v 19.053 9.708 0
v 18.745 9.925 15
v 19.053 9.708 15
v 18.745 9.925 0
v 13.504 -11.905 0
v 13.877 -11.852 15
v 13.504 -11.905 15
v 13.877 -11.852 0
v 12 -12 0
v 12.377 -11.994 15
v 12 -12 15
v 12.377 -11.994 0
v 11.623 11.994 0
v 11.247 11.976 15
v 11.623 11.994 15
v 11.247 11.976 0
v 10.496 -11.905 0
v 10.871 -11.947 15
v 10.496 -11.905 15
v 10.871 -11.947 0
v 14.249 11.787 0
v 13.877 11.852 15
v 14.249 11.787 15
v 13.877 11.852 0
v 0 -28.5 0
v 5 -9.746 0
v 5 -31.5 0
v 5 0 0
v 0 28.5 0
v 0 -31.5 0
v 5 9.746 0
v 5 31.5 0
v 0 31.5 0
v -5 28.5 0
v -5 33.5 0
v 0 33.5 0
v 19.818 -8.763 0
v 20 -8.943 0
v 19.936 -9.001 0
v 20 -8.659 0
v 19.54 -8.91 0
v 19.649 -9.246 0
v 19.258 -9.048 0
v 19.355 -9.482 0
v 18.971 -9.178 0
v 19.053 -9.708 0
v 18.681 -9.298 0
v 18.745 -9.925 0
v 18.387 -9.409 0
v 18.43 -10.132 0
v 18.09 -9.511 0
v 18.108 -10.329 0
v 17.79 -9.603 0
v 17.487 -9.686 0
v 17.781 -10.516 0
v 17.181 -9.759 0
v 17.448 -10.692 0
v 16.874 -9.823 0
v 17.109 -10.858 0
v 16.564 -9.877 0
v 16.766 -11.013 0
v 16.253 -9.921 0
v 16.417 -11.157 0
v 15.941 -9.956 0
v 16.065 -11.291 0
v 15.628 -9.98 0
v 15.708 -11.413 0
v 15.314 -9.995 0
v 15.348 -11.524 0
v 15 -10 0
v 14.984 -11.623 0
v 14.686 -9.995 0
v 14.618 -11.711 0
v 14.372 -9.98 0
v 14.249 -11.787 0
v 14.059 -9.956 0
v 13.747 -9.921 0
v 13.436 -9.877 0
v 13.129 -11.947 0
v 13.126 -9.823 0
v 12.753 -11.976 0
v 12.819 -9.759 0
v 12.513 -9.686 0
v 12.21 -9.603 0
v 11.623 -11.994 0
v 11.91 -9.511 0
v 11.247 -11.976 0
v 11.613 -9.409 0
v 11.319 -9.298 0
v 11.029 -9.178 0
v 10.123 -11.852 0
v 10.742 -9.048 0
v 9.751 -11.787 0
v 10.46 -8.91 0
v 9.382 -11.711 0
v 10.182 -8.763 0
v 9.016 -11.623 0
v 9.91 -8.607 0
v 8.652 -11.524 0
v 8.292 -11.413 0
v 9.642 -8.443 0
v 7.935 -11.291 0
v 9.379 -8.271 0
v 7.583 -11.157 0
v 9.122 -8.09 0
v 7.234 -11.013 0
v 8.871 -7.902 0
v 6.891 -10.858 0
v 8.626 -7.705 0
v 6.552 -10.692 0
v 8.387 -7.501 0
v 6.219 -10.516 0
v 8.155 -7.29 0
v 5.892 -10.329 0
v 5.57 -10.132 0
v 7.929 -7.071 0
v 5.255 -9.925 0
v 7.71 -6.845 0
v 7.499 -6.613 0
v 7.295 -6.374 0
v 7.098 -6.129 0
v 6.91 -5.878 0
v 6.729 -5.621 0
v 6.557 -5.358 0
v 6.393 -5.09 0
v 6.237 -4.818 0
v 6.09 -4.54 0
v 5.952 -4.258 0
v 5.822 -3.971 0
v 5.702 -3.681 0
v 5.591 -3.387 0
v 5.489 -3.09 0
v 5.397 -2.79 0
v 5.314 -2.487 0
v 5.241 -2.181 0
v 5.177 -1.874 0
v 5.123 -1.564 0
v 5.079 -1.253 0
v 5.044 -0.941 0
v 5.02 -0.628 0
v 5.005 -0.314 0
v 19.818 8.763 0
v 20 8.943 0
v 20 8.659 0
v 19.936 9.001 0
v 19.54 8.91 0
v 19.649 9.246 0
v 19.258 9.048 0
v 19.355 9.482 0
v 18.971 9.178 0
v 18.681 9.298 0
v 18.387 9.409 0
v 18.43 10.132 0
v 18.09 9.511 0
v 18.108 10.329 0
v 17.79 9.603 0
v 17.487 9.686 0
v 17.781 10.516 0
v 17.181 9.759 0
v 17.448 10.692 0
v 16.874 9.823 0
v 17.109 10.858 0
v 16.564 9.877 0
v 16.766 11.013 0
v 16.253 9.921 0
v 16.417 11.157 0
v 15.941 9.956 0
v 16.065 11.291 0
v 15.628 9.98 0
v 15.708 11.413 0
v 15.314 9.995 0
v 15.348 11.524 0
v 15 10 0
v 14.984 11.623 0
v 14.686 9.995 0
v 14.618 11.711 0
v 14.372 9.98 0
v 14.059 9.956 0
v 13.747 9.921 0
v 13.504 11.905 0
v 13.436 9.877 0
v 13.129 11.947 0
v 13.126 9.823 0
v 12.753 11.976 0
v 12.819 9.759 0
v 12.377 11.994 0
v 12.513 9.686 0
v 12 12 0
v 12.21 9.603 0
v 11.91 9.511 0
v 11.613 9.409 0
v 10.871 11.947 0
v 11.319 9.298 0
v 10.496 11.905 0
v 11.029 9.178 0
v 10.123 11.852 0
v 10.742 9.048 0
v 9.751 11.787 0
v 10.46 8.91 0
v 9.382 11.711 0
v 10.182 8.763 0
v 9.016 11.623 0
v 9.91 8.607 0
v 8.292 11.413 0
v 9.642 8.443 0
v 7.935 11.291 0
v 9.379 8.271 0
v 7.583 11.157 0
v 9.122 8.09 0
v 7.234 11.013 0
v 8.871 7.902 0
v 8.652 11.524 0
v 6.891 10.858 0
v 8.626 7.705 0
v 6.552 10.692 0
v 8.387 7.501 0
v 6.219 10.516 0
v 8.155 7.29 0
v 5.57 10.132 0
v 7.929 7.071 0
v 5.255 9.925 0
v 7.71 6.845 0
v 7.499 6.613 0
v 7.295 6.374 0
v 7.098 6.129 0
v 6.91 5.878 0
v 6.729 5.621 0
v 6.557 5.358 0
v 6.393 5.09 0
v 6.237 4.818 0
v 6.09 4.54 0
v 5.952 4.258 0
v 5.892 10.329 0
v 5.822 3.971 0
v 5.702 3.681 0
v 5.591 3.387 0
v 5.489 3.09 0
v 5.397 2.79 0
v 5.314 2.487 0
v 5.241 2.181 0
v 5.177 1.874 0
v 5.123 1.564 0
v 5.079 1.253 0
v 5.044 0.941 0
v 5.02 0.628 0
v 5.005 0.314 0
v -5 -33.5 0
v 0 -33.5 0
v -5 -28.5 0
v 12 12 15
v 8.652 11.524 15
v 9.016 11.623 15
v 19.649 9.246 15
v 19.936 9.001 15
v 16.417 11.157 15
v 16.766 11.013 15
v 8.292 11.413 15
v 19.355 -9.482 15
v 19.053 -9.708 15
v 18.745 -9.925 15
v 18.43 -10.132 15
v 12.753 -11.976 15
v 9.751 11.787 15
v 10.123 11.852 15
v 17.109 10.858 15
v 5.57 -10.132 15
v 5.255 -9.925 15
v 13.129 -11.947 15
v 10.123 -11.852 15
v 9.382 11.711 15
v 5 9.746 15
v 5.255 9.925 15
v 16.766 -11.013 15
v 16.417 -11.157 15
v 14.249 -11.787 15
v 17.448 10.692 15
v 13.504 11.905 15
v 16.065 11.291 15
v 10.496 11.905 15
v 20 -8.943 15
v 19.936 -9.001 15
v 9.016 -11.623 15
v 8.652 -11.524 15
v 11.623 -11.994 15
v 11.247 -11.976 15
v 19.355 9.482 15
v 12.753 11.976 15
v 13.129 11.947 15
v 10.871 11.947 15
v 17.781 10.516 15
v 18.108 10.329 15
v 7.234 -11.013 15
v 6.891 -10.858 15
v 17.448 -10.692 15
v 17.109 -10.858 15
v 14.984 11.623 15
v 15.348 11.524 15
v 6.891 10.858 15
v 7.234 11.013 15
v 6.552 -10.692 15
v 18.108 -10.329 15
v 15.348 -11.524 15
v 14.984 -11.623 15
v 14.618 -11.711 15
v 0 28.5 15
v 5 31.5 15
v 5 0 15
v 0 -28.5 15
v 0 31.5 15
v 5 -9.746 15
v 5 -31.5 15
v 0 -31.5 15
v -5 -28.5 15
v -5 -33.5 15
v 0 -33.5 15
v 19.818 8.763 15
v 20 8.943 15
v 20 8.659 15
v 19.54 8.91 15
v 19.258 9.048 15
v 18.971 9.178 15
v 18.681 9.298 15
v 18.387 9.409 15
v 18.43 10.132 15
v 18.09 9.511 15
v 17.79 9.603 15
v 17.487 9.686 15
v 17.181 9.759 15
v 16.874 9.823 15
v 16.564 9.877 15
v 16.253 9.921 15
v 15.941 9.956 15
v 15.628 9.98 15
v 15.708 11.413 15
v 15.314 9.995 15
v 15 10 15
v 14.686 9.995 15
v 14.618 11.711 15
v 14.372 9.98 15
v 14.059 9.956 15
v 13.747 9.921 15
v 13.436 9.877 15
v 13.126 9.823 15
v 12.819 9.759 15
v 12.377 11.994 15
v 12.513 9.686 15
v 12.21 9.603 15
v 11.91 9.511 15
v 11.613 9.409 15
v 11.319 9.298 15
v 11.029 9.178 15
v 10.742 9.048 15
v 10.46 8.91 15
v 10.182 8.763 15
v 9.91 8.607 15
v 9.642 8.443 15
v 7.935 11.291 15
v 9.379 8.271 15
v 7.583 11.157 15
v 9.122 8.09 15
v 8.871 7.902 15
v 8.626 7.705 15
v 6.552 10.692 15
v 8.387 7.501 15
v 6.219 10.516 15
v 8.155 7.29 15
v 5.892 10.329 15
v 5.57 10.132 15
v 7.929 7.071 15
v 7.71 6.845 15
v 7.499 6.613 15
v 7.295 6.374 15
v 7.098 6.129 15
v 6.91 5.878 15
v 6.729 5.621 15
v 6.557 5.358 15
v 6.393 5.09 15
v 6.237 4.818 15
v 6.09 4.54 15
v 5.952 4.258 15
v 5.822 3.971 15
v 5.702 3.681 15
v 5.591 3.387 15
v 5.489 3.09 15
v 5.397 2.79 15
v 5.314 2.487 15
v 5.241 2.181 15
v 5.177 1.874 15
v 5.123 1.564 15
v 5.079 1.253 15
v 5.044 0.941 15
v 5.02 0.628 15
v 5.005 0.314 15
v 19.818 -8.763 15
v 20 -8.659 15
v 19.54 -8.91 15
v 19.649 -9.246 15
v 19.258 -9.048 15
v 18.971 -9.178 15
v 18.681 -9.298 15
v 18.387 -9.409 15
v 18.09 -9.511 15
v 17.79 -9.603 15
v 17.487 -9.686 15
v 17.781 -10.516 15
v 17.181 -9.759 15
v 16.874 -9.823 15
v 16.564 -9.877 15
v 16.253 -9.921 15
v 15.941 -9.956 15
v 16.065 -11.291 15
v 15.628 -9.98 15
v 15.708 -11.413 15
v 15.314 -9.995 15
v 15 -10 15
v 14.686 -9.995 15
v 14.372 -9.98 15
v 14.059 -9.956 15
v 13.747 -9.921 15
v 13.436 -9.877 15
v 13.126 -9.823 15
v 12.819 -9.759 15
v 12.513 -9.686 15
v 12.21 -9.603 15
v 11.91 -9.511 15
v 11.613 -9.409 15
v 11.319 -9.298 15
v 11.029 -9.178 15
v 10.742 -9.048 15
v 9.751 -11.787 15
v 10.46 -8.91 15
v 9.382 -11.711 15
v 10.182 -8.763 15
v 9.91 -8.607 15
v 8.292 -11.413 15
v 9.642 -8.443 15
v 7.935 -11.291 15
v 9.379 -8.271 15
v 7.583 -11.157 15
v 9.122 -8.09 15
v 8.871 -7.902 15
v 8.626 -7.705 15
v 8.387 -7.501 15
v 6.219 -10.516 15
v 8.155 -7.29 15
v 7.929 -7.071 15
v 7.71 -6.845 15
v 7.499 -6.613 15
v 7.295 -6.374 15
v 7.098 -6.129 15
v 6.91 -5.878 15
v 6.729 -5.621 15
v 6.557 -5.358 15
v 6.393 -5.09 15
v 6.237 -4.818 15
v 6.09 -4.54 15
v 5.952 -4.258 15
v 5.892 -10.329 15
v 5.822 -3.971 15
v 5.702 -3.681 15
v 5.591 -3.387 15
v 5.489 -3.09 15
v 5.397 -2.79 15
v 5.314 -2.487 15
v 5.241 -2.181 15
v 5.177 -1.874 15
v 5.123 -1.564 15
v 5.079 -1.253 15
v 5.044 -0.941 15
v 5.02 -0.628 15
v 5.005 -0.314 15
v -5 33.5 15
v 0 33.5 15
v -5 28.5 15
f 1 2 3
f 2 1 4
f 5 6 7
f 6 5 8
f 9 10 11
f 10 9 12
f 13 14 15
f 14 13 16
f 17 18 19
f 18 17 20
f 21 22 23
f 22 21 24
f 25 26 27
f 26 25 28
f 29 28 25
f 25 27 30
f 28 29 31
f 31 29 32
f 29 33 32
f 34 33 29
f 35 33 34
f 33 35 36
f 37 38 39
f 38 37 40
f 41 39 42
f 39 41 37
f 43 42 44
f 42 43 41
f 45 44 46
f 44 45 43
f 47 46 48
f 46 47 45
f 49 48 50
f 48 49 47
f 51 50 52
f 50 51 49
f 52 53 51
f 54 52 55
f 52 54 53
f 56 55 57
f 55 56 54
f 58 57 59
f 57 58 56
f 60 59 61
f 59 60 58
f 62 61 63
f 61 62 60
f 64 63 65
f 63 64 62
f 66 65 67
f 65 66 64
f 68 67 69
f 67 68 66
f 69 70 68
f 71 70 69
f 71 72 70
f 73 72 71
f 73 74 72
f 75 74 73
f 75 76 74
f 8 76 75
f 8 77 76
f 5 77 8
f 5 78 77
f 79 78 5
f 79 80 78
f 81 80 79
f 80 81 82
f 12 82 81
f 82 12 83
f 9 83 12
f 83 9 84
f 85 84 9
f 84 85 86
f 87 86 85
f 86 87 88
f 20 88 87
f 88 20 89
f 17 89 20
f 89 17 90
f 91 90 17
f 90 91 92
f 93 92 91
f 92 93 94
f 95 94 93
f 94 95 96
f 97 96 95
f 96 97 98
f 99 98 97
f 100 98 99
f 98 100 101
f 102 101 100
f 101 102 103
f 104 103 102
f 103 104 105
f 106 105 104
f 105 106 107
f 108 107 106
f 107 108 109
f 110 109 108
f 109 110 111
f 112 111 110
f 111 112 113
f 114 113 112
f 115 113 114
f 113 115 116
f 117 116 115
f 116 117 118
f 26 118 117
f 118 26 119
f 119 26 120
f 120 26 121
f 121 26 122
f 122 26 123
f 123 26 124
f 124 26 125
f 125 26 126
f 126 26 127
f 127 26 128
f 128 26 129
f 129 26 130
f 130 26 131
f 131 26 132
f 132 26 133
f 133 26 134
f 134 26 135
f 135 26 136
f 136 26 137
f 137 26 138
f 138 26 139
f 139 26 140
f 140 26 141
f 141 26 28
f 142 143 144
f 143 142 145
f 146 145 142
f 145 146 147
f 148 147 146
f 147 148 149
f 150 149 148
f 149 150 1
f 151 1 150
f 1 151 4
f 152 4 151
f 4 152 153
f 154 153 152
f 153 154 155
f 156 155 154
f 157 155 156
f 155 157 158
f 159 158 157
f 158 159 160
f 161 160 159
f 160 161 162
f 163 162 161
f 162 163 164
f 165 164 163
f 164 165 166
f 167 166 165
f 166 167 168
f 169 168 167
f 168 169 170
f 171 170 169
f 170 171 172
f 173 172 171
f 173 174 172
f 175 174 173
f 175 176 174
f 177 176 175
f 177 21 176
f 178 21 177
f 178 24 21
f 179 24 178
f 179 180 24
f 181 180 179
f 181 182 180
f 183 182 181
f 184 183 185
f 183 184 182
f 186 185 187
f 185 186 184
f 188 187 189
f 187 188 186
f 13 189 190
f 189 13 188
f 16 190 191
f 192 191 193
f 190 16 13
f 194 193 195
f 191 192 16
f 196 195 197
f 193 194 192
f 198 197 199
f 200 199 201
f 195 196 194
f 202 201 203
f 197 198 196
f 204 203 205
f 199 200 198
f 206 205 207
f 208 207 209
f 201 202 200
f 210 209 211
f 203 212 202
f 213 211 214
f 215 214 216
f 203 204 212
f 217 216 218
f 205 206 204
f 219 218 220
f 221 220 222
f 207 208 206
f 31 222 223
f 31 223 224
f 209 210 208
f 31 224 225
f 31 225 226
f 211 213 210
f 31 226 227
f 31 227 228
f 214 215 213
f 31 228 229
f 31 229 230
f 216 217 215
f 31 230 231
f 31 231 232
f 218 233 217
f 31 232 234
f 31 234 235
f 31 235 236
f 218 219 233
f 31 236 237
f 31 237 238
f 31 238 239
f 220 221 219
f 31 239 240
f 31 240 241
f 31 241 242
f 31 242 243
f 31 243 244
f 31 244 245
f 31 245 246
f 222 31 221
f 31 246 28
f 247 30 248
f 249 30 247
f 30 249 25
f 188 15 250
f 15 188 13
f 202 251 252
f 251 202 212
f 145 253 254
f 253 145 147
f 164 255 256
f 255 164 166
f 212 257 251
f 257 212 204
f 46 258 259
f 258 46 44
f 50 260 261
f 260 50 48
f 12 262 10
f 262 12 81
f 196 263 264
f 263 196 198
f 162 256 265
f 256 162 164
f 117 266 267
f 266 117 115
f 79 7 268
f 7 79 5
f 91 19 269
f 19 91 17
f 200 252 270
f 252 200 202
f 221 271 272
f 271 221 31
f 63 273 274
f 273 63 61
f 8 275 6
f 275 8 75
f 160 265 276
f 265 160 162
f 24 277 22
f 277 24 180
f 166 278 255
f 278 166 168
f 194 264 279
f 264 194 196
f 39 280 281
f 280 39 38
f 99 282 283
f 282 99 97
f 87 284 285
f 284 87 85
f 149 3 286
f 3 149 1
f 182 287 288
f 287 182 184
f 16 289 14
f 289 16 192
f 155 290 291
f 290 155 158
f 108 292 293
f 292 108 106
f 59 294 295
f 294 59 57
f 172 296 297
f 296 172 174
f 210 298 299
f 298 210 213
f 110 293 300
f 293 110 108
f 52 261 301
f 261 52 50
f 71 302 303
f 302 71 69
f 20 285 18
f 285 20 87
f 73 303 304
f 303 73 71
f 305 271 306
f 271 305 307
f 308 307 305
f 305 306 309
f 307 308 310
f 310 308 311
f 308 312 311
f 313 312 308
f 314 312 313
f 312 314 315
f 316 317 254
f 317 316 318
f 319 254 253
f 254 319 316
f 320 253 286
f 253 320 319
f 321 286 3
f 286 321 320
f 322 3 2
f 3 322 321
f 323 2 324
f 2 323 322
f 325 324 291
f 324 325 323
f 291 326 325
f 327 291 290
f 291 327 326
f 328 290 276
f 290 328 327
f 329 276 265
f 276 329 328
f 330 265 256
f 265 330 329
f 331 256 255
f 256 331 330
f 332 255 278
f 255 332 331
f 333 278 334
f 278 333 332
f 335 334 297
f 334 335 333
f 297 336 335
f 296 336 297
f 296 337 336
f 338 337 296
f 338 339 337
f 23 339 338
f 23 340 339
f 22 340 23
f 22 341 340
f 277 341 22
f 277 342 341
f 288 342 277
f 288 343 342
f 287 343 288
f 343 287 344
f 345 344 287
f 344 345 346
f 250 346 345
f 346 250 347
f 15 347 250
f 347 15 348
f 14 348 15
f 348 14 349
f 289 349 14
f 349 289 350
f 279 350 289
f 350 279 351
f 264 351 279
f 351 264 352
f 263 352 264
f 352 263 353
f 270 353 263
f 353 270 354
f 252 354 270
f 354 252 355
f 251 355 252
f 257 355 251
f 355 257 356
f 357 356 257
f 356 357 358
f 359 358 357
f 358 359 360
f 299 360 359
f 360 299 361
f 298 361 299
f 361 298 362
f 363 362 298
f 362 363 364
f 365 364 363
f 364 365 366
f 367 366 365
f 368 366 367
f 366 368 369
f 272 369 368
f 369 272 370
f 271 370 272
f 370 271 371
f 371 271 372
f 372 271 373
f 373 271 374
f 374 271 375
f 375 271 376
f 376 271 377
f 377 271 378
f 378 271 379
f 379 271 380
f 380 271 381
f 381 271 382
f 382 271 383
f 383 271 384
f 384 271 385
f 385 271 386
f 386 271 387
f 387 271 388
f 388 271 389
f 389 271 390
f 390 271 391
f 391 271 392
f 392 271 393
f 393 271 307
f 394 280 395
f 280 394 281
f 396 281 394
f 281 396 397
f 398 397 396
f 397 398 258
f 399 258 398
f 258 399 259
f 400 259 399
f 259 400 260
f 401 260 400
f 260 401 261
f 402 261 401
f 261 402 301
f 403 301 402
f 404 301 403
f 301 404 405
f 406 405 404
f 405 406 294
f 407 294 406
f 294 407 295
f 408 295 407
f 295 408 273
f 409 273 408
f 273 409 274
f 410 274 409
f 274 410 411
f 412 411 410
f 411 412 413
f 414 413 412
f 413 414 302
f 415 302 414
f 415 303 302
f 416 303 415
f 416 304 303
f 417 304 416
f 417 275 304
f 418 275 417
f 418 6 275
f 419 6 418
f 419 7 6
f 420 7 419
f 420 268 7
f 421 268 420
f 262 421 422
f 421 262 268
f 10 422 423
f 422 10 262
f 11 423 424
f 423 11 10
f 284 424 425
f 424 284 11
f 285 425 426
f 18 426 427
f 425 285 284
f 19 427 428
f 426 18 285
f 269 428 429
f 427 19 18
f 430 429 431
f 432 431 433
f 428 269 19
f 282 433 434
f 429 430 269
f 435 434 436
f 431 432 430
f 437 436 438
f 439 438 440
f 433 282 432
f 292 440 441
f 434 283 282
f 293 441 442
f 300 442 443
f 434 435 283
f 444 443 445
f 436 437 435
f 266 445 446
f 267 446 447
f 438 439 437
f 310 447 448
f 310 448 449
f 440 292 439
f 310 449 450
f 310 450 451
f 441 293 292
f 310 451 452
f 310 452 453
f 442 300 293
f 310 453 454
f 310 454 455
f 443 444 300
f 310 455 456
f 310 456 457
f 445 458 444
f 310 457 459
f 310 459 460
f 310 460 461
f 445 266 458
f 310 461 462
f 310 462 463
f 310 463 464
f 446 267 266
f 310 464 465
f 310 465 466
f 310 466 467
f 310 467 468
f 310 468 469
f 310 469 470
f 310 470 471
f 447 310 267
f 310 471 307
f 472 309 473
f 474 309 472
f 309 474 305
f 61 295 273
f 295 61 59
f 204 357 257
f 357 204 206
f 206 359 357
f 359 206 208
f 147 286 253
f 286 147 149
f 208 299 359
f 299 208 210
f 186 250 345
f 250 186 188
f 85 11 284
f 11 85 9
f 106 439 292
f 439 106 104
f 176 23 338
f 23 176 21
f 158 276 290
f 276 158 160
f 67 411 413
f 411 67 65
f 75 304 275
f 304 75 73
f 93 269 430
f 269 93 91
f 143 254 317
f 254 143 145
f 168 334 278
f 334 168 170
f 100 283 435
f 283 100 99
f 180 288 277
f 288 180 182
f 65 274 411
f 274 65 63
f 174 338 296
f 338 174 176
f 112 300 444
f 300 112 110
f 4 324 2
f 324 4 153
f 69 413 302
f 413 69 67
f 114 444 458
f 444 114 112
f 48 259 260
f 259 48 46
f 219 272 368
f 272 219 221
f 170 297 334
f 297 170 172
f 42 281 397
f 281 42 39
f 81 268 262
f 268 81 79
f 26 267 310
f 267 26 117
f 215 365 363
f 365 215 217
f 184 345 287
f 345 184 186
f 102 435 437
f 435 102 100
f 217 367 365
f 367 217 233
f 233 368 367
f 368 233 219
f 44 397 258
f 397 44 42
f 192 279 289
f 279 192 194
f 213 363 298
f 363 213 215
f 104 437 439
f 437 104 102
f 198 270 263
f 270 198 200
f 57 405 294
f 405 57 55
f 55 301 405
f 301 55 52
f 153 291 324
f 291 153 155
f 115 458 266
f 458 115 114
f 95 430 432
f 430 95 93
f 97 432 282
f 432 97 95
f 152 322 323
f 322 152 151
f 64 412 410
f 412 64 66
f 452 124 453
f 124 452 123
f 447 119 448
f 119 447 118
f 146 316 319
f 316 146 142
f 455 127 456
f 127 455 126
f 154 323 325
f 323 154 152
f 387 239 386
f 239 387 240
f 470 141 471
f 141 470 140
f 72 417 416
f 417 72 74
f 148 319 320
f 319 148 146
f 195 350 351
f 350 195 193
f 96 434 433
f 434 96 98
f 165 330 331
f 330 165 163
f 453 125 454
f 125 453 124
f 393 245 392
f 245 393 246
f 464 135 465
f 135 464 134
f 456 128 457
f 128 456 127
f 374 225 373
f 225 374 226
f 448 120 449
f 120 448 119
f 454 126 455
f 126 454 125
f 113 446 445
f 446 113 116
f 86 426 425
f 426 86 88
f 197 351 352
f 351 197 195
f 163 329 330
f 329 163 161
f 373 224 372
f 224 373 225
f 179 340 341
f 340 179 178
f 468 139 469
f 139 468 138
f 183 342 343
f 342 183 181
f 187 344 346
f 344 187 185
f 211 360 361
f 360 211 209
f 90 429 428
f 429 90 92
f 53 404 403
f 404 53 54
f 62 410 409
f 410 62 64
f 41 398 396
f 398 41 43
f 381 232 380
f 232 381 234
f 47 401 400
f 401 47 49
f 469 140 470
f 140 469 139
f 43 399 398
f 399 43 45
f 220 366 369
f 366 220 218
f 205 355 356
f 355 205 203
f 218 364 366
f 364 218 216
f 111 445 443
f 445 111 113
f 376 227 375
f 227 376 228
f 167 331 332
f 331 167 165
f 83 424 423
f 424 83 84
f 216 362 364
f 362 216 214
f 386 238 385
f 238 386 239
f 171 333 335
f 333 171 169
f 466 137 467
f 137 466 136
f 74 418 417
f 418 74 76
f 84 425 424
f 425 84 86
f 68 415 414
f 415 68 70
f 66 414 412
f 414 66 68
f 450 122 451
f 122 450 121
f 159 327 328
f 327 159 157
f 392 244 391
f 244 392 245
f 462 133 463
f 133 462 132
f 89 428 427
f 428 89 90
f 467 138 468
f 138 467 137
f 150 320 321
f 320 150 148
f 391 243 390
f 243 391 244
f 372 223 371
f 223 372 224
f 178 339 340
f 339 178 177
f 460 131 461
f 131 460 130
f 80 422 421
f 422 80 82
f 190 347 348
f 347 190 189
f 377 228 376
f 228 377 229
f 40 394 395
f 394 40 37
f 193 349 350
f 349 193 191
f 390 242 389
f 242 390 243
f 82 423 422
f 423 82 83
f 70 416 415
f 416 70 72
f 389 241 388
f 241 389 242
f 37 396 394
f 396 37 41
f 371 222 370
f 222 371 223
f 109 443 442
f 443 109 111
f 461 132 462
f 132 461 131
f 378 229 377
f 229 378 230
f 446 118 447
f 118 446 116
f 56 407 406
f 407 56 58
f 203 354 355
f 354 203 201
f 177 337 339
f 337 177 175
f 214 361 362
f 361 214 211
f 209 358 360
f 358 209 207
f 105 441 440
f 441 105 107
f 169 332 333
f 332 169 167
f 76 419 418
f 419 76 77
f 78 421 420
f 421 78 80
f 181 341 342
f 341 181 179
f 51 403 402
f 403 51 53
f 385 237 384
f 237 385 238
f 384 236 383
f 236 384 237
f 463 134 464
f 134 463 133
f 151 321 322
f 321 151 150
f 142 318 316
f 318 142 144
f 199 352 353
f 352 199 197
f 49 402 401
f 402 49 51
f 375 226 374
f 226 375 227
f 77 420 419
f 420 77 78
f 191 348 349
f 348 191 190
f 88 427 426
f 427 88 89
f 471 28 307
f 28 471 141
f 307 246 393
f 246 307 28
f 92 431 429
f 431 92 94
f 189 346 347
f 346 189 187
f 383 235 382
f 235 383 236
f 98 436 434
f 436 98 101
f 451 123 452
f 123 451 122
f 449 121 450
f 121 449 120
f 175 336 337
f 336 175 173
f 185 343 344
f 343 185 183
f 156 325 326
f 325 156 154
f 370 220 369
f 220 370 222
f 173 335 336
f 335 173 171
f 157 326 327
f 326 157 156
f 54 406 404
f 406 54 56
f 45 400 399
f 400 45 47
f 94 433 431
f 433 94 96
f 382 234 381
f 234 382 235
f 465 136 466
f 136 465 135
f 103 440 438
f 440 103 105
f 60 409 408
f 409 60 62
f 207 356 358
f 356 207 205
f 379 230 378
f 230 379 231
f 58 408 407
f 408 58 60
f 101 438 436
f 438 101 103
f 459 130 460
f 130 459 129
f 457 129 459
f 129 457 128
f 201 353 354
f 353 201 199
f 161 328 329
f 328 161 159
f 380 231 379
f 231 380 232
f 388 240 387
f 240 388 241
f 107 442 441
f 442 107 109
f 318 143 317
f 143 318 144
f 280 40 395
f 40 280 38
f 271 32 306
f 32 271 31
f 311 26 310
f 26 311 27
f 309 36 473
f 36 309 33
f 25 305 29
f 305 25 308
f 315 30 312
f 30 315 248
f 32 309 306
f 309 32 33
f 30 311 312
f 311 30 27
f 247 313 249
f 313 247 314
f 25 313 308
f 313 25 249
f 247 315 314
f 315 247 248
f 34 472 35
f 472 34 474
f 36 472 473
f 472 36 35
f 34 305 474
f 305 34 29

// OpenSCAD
// This is a mount for cheap Hoftronic LED batten, which clamps
// around a standard 20mm (PVC) pipe, such as the ones used for
// electrical conduits.

$fn = 200;

height = 15;
width=63;

translate([15,0,0]) difference() { // x=trans cyl+d
    translate([-3,0,0]) cylinder(height, d=24);
    translate([0,0,-1]) cylinder(height+2, d=20);
    translate([5,-50,-1]) cube([100,100,height+2]);
}


translate([0,-width/2,0]) cube([5,width,height]);

translate([-5,-(width/2)-2,0]) cube([5,5,height]);
translate([-5,(width/2)-3,0]) cube([5,5,height]);
